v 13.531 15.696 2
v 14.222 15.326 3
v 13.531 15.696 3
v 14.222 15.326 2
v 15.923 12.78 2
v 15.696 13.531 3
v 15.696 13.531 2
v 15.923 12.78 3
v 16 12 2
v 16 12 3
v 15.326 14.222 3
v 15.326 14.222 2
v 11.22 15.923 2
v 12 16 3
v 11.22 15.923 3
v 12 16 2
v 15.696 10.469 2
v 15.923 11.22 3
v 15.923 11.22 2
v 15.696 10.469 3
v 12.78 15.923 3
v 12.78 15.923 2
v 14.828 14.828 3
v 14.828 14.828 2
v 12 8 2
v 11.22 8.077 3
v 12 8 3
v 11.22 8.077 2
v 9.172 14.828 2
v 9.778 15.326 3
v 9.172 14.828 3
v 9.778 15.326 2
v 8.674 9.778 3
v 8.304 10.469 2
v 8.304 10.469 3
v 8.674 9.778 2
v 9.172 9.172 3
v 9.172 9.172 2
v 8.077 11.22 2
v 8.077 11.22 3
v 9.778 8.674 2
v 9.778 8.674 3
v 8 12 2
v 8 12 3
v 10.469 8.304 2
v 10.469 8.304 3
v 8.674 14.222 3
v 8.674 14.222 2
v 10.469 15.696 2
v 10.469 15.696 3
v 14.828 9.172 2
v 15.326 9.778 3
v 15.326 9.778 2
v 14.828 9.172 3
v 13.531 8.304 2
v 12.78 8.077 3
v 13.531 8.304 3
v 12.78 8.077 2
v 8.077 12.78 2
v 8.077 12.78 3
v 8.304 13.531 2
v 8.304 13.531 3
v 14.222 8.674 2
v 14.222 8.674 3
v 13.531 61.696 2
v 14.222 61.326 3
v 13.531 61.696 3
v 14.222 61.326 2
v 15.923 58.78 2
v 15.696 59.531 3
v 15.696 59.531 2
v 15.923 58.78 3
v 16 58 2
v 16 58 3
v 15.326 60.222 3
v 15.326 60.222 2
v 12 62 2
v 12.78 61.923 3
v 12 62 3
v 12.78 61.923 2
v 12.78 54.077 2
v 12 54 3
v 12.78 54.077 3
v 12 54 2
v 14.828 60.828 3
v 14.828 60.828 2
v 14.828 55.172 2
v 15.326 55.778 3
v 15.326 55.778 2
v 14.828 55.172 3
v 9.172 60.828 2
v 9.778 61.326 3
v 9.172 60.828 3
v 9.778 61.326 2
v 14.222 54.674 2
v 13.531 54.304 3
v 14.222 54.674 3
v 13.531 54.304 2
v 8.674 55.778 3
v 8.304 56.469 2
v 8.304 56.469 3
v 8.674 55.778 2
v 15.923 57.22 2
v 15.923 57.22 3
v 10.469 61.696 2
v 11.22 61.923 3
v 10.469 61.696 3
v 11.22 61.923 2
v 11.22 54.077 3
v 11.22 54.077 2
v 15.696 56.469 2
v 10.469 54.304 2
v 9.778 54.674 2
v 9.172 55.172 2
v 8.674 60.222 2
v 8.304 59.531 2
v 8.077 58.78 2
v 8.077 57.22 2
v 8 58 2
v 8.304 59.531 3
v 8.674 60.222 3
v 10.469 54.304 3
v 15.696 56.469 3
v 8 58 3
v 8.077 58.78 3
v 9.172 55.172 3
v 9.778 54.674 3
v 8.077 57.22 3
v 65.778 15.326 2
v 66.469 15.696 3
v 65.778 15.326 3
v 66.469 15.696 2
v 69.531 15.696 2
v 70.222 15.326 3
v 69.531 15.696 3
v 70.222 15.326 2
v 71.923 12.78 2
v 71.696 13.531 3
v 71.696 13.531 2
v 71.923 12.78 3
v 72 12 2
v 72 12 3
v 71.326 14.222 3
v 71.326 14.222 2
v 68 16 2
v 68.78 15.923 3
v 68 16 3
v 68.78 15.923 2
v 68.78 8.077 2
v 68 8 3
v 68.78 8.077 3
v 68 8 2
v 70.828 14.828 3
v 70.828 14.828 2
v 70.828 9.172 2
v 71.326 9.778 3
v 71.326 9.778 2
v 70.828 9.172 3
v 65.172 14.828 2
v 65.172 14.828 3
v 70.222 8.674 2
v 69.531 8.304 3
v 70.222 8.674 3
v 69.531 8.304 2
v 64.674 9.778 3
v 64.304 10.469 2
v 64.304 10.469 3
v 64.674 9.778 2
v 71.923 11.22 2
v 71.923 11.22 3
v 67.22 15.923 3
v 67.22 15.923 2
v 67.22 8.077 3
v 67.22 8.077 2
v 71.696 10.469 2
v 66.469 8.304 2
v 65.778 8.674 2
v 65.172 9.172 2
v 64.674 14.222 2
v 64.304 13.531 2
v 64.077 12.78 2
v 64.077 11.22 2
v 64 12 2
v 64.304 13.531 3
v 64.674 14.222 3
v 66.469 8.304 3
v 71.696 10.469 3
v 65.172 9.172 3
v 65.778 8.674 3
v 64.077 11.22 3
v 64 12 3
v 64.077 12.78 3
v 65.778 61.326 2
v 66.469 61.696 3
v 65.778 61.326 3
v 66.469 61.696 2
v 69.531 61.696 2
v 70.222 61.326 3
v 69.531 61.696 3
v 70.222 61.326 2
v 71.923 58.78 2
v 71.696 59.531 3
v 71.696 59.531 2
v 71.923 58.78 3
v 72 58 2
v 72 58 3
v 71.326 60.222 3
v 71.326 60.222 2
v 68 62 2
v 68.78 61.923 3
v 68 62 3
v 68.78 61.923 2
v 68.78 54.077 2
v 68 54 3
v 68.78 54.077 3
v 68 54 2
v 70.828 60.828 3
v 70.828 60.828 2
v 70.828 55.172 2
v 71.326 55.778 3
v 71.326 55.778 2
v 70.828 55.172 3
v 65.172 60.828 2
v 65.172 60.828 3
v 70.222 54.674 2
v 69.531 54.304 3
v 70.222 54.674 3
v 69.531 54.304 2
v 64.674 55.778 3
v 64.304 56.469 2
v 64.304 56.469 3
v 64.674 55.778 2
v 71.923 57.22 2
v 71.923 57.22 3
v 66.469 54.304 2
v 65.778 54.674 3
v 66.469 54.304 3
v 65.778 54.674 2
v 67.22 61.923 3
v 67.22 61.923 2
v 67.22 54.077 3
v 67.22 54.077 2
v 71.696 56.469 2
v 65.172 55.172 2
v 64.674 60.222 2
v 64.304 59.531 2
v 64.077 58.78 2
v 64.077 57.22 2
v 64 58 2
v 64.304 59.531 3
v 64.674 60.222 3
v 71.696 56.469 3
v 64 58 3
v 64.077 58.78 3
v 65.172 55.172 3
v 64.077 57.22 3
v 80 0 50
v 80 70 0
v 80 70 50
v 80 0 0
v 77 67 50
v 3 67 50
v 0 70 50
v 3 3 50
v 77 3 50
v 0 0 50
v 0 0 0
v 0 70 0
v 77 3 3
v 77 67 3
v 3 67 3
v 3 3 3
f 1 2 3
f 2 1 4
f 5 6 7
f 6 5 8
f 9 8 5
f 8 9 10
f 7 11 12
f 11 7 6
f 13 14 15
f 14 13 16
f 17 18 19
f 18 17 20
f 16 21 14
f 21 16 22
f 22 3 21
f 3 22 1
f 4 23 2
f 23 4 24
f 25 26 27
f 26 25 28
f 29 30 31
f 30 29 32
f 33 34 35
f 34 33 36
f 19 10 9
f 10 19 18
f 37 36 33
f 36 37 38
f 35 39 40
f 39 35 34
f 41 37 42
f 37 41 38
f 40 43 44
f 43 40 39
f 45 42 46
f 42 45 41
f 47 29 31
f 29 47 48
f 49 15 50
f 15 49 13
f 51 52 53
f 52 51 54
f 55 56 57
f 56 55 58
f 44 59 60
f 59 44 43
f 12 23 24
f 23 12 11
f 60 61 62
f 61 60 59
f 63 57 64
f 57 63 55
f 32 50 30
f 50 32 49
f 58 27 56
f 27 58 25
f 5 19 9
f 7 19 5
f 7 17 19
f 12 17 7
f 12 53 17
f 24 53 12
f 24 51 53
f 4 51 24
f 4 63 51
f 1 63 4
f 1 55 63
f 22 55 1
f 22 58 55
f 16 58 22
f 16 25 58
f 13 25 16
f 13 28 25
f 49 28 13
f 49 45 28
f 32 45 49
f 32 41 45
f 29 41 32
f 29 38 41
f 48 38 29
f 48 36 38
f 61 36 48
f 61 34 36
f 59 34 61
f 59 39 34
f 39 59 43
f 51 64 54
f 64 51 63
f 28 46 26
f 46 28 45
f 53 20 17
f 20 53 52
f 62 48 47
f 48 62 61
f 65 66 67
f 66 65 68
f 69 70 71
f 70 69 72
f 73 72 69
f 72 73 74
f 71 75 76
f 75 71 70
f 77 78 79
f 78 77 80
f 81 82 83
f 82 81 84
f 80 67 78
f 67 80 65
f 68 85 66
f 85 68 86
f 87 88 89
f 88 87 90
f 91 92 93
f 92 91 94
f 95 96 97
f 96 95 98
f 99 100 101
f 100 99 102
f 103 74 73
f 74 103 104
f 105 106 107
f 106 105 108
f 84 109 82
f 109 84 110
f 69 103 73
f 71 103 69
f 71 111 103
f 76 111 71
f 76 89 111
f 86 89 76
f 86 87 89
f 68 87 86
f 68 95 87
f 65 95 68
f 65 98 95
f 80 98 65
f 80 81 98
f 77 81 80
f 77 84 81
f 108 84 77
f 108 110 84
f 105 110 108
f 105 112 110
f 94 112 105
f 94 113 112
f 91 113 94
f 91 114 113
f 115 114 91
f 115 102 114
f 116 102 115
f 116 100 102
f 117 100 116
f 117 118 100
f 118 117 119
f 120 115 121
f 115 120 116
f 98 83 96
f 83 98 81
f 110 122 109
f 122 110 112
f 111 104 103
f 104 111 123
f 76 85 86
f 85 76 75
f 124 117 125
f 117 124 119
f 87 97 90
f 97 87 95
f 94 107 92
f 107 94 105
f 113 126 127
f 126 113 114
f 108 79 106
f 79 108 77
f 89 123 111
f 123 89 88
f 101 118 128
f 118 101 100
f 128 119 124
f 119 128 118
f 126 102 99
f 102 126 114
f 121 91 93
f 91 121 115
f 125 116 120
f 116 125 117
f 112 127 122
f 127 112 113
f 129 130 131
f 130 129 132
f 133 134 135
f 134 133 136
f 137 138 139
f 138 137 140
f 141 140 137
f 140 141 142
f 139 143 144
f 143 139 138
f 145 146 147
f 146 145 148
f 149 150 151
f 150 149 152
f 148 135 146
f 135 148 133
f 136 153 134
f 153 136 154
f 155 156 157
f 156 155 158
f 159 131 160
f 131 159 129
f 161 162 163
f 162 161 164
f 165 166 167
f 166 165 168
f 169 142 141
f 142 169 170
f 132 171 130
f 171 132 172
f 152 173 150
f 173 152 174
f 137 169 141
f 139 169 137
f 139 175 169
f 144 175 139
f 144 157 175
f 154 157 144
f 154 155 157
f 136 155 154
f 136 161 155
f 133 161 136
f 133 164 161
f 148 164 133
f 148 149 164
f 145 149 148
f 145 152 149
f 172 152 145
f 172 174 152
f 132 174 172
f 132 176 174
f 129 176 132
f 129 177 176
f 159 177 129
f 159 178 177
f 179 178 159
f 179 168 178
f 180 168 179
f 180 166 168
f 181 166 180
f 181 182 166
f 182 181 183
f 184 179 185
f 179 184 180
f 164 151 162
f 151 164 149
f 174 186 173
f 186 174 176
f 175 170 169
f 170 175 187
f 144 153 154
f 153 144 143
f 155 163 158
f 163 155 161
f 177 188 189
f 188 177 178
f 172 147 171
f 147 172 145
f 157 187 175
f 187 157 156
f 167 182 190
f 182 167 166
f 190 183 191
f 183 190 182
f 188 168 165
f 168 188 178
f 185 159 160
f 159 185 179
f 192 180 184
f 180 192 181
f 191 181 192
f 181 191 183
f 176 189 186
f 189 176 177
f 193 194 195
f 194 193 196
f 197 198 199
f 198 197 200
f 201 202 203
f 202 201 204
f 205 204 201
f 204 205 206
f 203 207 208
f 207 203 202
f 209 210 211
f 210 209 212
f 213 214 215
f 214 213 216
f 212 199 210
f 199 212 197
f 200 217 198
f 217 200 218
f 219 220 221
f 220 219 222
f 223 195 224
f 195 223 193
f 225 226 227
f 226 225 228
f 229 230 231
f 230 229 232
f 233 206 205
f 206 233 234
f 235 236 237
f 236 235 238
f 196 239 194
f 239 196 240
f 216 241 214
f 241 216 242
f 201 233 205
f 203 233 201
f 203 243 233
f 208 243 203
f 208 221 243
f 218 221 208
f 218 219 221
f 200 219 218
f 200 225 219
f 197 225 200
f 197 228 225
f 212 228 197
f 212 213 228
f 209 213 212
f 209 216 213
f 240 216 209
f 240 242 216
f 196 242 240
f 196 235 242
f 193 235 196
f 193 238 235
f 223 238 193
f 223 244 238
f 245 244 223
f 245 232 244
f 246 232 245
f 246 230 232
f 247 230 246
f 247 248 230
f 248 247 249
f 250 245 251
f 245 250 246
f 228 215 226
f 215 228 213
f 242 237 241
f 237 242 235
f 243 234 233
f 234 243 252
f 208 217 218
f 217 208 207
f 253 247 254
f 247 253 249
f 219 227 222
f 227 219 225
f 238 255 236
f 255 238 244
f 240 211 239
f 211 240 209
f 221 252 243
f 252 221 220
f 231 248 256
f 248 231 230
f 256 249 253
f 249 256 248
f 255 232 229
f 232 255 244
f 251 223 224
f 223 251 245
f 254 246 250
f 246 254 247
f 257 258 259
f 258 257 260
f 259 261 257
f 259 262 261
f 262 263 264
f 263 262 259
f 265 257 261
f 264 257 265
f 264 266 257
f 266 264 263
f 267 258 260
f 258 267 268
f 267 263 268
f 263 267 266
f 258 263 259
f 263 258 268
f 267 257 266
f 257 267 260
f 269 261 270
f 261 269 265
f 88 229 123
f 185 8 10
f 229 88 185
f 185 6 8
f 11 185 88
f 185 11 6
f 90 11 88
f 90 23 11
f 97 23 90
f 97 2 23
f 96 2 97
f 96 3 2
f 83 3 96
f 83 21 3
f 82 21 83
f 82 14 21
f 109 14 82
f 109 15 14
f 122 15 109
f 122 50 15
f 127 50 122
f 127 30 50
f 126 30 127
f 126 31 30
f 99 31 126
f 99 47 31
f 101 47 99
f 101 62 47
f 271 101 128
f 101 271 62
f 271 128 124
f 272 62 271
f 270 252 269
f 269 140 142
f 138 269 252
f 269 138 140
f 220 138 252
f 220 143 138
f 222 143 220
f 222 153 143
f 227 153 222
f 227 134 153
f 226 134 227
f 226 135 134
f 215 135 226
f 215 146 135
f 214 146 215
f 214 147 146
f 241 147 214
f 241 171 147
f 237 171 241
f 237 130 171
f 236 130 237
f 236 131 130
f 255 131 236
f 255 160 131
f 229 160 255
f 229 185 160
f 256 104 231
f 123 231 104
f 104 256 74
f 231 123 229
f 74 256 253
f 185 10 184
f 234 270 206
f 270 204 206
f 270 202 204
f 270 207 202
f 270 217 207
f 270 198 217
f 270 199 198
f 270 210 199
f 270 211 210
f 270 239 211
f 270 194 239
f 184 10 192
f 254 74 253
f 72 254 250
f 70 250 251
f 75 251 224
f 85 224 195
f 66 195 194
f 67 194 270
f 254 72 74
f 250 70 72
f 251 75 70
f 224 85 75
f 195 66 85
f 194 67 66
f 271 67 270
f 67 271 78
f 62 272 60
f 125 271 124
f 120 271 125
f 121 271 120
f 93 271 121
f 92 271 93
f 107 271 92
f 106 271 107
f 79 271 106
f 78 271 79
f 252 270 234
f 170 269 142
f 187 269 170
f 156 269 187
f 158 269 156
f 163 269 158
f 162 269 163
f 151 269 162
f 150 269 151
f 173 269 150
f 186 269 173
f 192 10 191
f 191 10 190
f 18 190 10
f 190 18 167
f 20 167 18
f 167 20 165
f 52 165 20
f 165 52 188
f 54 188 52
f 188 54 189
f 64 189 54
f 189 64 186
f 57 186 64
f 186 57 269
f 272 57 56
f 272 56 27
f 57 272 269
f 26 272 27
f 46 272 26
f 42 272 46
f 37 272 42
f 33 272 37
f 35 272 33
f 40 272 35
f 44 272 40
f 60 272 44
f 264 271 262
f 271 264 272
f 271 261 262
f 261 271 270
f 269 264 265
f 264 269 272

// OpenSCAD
$fn = 32;

// ----------------------------------------------------------------------
// Enclosure box: bosses enclosure
// ----------------------------------------------------------------------

// --- parameters (mm) ---
box_l = 80;               // outer length, X
box_w = 70;               // outer width, Y
box_h = 50;               // outer height
wall_t = 3;               // wall thickness
boss_r = 4;               // corner boss radius
hole_r = 2;               // boss screw hole radius
boss_in = 12;             // boss inset from the corners

inner_h = box_h - wall_t;  // cavity depth
boss_h = inner_h - 2;  // corner boss height

difference() {
  cube([box_l, box_w, box_h]);
  translate([wall_t, wall_t, wall_t])
    cube([box_l - 2 * wall_t, box_w - 2 * wall_t, box_h]);
  for (sx = [0, 1], sy = [0, 1])
    translate([sx ? box_l - boss_in : boss_in,
               sy ? box_w - boss_in : boss_in, wall_t - 1]) {
      cylinder(r = boss_r, h = boss_h);
      translate([0, 0, boss_h - 4])
        cylinder(r = hole_r, h = 5);
    }
}
